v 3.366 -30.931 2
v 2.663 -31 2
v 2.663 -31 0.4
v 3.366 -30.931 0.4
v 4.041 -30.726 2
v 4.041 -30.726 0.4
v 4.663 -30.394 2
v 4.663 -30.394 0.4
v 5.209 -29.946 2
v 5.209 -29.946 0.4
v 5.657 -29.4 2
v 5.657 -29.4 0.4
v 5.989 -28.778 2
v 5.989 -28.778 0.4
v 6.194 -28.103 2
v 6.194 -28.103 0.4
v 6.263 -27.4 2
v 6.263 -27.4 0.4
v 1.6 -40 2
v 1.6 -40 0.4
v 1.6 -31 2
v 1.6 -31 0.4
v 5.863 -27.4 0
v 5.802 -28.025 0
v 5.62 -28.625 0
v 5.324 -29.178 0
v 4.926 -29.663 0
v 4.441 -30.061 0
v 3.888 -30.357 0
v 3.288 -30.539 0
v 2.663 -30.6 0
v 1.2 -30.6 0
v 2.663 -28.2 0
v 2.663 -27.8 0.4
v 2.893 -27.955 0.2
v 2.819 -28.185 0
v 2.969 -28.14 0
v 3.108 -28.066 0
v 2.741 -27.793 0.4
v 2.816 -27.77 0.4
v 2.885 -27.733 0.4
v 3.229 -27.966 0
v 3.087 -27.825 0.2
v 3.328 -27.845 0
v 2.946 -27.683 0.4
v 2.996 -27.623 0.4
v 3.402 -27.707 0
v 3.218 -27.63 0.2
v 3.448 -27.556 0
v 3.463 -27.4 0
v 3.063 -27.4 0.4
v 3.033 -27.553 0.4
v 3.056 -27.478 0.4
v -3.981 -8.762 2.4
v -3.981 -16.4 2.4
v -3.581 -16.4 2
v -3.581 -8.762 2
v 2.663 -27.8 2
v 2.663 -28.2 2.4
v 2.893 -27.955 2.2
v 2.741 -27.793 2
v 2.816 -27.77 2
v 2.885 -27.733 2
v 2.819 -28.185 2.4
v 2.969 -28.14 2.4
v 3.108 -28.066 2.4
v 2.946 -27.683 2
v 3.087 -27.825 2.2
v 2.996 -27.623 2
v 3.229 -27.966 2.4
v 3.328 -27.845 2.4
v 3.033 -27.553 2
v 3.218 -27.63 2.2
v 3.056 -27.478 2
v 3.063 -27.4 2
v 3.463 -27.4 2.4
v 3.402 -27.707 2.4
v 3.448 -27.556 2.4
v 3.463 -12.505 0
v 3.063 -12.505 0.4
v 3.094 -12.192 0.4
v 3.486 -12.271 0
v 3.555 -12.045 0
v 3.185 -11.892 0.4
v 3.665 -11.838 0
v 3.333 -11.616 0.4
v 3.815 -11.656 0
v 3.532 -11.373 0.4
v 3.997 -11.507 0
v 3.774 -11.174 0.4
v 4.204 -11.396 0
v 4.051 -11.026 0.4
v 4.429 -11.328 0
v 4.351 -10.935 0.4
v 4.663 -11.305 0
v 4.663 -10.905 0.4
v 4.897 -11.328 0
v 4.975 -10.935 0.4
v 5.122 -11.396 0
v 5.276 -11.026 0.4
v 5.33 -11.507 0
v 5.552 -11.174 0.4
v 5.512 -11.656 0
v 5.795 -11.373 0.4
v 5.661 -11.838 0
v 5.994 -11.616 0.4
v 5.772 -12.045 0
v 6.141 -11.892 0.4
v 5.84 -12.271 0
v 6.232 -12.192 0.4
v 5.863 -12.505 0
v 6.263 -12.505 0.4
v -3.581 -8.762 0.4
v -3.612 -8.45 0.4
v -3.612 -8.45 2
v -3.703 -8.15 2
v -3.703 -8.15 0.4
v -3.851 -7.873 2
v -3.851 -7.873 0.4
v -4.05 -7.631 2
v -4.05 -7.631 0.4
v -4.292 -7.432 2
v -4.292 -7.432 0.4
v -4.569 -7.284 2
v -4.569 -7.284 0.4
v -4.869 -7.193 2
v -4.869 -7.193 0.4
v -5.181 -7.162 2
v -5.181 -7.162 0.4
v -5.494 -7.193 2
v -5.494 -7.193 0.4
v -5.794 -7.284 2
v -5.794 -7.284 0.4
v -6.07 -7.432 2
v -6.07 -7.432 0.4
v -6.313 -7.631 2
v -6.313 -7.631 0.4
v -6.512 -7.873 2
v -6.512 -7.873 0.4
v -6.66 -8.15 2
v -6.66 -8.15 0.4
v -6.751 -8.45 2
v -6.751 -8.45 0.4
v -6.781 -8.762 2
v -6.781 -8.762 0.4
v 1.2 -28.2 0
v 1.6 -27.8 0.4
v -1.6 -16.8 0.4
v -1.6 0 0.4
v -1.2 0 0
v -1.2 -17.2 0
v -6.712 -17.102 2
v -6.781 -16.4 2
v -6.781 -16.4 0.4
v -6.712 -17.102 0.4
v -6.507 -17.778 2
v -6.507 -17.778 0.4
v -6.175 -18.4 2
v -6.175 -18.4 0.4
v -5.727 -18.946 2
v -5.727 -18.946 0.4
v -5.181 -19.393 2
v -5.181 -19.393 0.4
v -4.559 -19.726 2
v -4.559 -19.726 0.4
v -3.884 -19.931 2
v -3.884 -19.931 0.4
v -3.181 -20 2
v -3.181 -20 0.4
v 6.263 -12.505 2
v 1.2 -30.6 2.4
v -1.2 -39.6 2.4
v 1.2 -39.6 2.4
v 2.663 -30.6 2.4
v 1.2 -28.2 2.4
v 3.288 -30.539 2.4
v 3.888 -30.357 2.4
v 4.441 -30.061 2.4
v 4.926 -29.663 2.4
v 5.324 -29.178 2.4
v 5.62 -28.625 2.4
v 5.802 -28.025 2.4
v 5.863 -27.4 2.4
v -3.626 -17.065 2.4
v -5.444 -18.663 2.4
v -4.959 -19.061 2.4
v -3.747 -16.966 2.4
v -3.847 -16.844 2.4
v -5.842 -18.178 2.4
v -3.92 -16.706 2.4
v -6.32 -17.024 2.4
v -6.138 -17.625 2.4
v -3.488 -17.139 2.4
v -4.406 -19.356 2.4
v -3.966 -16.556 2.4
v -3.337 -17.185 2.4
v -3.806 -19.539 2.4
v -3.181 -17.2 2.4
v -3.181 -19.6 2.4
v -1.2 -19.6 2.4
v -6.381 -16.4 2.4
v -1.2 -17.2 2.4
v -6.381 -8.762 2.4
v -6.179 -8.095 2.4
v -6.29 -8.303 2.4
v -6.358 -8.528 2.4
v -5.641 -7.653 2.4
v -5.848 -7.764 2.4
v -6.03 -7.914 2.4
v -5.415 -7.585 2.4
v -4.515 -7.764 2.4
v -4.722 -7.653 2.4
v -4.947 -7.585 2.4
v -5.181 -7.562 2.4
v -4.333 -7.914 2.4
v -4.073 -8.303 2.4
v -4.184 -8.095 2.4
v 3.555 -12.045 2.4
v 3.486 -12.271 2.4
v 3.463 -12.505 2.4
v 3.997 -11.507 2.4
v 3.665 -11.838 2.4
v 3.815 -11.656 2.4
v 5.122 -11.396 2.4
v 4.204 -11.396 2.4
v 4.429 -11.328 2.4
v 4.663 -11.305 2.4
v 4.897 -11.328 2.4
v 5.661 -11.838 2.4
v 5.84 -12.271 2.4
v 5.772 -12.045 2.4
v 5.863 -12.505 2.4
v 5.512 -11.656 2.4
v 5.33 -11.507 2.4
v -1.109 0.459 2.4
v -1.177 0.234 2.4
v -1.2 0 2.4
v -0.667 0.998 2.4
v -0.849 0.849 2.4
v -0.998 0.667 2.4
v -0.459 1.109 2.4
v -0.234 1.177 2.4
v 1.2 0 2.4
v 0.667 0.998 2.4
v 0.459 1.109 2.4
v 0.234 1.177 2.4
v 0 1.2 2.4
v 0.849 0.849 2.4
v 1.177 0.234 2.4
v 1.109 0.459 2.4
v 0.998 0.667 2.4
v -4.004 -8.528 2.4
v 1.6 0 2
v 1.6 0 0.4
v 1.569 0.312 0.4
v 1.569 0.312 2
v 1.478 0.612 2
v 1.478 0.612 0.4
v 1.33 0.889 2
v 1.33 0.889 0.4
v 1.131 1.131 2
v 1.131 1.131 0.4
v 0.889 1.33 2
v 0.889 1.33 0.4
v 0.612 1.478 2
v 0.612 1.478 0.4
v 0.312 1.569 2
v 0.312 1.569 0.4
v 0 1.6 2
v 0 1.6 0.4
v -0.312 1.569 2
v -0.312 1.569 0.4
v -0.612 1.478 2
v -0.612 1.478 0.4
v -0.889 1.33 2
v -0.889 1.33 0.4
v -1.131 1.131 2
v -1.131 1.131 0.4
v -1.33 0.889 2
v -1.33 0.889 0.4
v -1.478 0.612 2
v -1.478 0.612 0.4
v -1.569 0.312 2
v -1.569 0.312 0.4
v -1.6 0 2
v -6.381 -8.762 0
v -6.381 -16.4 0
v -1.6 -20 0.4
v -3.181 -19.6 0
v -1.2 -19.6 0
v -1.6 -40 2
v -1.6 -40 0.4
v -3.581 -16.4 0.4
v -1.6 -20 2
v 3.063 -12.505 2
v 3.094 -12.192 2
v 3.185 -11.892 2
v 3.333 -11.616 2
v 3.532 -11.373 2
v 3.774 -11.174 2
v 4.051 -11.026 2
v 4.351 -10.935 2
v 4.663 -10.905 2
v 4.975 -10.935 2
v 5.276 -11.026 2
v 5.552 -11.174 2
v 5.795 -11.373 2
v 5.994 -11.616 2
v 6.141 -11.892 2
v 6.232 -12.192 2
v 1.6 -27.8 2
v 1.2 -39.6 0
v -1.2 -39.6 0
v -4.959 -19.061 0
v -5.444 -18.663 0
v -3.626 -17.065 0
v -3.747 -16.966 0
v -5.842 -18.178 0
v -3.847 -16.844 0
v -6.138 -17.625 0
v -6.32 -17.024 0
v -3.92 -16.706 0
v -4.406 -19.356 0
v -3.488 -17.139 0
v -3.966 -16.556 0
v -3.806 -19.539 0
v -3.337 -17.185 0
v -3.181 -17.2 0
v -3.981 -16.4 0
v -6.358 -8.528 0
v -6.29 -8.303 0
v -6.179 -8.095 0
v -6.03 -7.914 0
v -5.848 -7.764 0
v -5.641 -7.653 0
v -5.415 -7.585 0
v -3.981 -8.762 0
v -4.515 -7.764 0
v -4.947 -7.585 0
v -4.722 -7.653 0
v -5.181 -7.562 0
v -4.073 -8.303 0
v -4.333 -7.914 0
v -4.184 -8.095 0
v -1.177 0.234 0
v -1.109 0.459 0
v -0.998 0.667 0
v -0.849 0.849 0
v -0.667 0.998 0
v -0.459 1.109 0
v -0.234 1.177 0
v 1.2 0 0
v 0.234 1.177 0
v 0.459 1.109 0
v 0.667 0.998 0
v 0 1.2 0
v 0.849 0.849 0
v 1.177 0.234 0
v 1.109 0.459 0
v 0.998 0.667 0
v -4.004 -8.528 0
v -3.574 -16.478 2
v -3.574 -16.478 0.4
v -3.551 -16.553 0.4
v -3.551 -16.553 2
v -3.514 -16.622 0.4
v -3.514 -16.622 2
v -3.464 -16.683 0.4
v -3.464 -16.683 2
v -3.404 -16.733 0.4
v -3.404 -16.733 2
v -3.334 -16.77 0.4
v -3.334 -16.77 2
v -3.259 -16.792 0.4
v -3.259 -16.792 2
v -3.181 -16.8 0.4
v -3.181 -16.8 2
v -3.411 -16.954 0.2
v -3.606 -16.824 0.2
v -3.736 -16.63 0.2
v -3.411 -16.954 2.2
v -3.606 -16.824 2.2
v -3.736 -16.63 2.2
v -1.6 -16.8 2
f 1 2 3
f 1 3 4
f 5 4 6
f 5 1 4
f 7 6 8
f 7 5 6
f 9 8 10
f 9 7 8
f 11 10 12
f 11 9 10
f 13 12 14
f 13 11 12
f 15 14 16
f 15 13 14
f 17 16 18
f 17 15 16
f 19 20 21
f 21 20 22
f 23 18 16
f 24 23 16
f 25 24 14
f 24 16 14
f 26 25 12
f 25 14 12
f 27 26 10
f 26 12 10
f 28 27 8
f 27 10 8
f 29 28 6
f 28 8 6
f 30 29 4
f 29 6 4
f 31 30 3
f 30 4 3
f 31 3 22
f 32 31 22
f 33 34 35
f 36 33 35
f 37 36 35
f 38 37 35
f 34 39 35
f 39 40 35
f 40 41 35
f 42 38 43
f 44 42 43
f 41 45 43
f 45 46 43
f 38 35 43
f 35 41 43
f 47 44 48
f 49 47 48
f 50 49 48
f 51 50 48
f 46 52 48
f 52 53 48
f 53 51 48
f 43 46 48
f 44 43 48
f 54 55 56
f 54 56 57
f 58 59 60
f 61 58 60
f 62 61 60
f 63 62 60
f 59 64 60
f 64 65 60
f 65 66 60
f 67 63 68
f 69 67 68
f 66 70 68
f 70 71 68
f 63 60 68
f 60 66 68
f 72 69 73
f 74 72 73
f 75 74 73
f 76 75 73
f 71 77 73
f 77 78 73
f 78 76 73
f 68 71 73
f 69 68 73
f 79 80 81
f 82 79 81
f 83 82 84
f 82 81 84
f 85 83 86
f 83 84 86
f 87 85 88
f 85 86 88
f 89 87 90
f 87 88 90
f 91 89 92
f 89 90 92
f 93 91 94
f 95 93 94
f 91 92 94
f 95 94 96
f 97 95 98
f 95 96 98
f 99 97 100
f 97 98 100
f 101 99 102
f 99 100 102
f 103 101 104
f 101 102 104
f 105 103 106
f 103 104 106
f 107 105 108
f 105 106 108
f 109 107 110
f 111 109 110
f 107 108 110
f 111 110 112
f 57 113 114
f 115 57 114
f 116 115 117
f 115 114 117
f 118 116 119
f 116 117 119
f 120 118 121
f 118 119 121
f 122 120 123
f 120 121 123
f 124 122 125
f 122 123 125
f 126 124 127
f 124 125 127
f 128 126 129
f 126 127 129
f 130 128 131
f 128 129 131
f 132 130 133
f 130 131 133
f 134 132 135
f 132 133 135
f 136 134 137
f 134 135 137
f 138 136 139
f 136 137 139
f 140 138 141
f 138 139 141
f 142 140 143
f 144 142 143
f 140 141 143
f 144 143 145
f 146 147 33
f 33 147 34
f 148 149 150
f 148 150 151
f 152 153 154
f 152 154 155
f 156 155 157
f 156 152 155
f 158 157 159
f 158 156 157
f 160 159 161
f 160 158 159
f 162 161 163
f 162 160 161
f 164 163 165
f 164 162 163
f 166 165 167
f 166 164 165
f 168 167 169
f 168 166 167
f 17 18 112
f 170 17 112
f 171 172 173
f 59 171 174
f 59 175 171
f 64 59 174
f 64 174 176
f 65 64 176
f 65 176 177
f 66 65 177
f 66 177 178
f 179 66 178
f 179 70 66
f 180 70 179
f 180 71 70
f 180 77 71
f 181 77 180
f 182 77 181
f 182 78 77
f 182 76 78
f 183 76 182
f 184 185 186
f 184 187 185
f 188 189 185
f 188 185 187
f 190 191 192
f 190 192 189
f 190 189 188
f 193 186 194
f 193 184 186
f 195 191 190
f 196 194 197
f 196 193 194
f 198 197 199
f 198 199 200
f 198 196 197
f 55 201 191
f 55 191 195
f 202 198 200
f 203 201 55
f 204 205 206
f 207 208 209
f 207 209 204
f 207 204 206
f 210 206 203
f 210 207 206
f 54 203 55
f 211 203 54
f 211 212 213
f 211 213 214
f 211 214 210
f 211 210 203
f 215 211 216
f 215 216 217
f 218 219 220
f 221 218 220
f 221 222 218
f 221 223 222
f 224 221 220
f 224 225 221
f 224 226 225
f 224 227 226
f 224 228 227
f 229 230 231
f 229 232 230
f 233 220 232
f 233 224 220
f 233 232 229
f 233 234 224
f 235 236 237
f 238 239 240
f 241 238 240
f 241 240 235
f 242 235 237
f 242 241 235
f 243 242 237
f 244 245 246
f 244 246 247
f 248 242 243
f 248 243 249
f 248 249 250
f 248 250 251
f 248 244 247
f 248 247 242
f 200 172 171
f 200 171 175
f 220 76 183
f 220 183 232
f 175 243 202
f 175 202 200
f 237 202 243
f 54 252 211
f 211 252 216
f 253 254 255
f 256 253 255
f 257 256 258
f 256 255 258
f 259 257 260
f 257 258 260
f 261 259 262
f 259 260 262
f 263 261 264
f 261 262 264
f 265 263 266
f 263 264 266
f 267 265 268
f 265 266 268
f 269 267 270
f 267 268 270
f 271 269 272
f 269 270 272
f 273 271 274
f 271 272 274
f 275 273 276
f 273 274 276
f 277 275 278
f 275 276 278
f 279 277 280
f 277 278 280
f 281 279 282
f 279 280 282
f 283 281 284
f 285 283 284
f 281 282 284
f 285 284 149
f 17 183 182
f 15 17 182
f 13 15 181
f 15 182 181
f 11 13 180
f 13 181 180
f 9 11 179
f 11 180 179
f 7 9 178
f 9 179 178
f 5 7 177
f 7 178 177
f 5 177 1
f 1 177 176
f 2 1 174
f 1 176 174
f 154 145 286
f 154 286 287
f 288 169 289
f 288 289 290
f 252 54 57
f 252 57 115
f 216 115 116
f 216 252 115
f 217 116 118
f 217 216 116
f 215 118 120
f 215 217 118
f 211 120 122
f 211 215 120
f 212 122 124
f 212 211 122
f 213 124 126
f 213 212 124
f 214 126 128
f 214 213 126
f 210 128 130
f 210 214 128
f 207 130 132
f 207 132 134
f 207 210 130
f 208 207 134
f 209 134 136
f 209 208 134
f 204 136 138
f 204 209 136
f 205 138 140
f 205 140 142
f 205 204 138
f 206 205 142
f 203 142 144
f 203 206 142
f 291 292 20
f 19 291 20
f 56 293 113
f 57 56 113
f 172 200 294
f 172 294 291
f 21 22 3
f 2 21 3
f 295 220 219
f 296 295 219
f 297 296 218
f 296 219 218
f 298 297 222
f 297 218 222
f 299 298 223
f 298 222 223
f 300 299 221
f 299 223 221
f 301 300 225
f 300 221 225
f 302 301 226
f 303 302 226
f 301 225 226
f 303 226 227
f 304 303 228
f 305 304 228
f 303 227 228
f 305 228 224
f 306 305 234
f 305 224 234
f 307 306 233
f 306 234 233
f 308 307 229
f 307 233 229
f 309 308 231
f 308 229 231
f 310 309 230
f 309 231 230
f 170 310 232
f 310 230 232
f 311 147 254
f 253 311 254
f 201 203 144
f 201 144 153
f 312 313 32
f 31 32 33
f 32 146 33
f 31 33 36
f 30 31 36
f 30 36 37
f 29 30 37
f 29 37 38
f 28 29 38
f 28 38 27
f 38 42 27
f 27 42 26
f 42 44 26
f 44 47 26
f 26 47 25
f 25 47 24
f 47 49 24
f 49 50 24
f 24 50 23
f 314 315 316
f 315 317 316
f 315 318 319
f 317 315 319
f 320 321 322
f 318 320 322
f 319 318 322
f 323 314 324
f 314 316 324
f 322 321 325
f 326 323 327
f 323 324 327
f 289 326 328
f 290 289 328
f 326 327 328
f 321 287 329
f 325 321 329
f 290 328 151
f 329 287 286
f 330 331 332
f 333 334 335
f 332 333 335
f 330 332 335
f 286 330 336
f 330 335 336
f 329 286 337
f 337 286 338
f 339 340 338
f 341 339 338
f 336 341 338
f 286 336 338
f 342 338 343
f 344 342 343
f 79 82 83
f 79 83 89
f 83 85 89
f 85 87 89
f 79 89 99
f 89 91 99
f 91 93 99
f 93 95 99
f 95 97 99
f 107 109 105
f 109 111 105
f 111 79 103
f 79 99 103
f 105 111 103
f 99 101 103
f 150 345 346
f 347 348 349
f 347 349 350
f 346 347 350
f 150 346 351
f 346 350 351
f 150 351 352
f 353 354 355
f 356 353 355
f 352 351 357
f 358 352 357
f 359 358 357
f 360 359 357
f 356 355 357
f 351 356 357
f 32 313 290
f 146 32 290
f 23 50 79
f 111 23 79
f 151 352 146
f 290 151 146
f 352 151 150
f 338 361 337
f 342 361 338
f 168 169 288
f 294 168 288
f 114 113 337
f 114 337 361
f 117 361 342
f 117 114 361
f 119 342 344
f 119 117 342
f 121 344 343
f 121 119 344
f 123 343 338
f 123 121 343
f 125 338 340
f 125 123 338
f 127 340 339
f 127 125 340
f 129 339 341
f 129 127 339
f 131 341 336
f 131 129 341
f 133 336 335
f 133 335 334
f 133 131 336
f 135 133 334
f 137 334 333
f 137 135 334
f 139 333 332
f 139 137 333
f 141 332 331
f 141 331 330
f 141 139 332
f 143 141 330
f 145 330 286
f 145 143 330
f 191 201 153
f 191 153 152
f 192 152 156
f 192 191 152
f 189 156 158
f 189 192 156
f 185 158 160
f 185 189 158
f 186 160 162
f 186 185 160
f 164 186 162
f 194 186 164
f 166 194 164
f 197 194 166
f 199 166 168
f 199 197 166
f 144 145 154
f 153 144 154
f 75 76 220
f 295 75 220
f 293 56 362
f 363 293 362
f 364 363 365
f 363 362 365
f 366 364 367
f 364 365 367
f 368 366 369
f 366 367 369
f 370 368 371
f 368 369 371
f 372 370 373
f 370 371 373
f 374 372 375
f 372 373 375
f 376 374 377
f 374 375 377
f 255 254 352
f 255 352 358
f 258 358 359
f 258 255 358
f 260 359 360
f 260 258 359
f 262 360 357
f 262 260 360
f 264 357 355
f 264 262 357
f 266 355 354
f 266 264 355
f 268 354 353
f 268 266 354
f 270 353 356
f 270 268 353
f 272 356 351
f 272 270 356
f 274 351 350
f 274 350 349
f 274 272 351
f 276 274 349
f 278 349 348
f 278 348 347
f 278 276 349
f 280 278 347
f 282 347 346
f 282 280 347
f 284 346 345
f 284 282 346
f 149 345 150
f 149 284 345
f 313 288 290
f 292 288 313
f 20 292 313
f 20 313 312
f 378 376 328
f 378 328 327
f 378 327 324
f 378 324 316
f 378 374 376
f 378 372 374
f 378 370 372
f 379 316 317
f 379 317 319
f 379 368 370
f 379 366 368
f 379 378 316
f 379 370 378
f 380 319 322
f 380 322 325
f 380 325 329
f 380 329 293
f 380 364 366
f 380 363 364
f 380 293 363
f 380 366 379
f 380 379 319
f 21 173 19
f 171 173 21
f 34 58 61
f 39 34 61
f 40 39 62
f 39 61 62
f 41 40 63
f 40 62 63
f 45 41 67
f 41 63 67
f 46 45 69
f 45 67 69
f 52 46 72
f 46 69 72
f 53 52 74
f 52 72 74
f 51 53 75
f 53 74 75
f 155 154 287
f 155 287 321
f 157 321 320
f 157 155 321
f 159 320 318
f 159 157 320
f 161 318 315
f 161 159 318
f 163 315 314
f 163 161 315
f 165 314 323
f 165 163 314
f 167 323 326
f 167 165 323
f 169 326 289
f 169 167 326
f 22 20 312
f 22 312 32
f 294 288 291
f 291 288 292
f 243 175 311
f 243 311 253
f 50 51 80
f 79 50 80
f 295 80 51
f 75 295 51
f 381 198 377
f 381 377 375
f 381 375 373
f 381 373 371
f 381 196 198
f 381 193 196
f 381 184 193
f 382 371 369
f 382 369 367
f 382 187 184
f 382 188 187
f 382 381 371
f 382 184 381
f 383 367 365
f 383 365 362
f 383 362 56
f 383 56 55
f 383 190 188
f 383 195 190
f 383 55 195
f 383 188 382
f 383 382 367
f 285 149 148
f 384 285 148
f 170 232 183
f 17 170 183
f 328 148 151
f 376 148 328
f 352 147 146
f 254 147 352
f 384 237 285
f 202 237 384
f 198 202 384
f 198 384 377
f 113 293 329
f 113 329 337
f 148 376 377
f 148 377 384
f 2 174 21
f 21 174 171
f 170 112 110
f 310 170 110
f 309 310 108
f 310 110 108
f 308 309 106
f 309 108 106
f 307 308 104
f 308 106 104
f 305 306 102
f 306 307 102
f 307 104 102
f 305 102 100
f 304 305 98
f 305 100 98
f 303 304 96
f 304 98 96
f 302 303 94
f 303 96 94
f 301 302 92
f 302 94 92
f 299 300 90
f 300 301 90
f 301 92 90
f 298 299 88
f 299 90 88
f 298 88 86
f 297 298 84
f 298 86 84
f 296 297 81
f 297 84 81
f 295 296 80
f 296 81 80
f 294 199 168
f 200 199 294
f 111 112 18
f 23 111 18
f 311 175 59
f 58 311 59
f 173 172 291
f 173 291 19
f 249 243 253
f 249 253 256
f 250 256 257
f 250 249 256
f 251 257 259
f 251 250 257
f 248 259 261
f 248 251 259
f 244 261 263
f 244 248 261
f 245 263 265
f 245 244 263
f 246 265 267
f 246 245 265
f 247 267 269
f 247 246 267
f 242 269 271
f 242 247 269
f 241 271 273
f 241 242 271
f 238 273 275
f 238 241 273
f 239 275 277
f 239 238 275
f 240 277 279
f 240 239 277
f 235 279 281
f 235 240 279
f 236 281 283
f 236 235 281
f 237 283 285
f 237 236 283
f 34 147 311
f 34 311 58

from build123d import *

# Parameters (mm, degrees)
F0_W     = 1.4632290646
F0_H     = 3.2
F0_W_2   = 1.9813749596
F1_DEPTH = 2.4
F2_R     = 3.6
F3_R     = 0.4
F4_SIZE  = 0.4


with BuildPart() as f1:
    # F0 (on Top) → F1 (new body)
    with BuildSketch(Plane.XY):
        with BuildLine():
            Line((-1.6, 0), (1.6, 0))
            ThreePointArc((1.6, 0), (0, 1.6), (-1.6, 0))
        make_face()
        with BuildLine():
            Line((1.6, -27.8004167259), (1.6, 0))
            ThreePointArc((1.6, 0), (0, -1.6), (-1.6, 0))
            Line((-1.6, 0), (-1.6, -16.8))
            Line((-1.6, -16.8), (-1.6, -20))
            Line((-1.6, -20), (-1.6, -40))
            Line((-1.6, -40), (1.6, -40))
            Line((1.6, -40), (1.6, -31.0004167259))
            Line((1.6, -31.0004167259), (1.6, -27.8004167259))
        make_face()
        with BuildLine():
            ThreePointArc((-1.6, 0), (0, -1.6), (1.6, 0))
            Line((1.6, 0), (-1.6, 0))
        make_face()
        with Locations((2.3316145323, -29.4004167259)):
            Rectangle(F0_W, F0_H)
        with Locations((-2.5906874798, -18.4)):
            Rectangle(F0_W_2, F0_H)
        with BuildLine():
            Line((3.0632290646, -12.50463631), (3.0632290646, -27.8004167259))
            Line((3.0632290646, -27.8004167259), (3.0632290646, -31.0004167259))
            Line((3.0632290646, -31.0004167259), (6.2632290646, -31.0004167259))
            Line((6.2632290646, -31.0004167259), (6.2632290646, -12.50463631))
            ThreePointArc((6.2632290646, -12.50463631), (4.6632290646, -14.10463631), (3.0632290646, -12.50463631))
        make_face()
        with BuildLine():
            Line((-3.5813749596, -20), (-3.5813749596, -16.8))
            Line((-3.5813749596, -16.8), (-3.5813749596, -8.7620876729))
            ThreePointArc((-3.5813749596, -8.7620876729), (-5.1813749596, -10.3620876729), (-6.7813749596, -8.7620876729))
            Line((-6.7813749596, -8.7620876729), (-6.7813749596, -20))
            Line((-6.7813749596, -20), (-3.5813749596, -20))
        make_face()
        with BuildLine():
            ThreePointArc((6.2632290646, -12.50463631), (4.6632290646, -10.90463631), (3.0632290646, -12.50463631))
            Line((3.0632290646, -12.50463631), (6.2632290646, -12.50463631))
        make_face()
        with BuildLine():
            Line((6.2632290646, -12.50463631), (3.0632290646, -12.50463631))
            ThreePointArc((3.0632290646, -12.50463631), (4.6632290646, -14.10463631), (6.2632290646, -12.50463631))
        make_face()
        with BuildLine():
            ThreePointArc((-6.7813749596, -8.7620876729), (-5.1813749596, -10.3620876729), (-3.5813749596, -8.7620876729))
            Line((-3.5813749596, -8.7620876729), (-6.7813749596, -8.7620876729))
        make_face()
        with BuildLine():
            Line((-6.7813749596, -8.7620876729), (-3.5813749596, -8.7620876729))
            ThreePointArc((-3.5813749596, -8.7620876729), (-5.1813749596, -7.1620876729), (-6.7813749596, -8.7620876729))
        make_face()
    extrude(amount=F1_DEPTH)

    # F2
    f2_edges = [f1.edges().sort_by_distance(p)[0] for p in [
        (-6.781375, -20, 1.2),
        (6.263229, -31.000417, 1.2),
    ]]
    fillet(f2_edges, radius=F2_R)

    # F3
    f3_edges = [f1.edges().sort_by_distance(p)[0] for p in [
        (-3.581375, -16.8, 1.2),
        (3.063229, -27.800417, 1.2),
    ]]
    fillet(f3_edges, radius=F3_R)

    # F4
    f4_edges = [f1.edges().sort_by_distance(p)[0] for p in [
        (-3.581375, -12.581044, 2.4),
        (-3.464218, -16.682843, 2.4),
        (-5.181375, -7.162088, 2.4),
        (-2.390687, -16.8, 2.4),
        (-6.781375, -12.581044, 2.4),
        (-1.6, -8.4, 2.4),
        (-5.726959, -18.945584, 2.4),
        (0, 1.6, 2.4),
        (-2.390687, -20, 2.4),
        (1.6, -13.900208, 2.4),
        (-1.6, -30, 2.4),
        (2.131615, -27.800417, 2.4),
        (0, -40, 2.4),
        (2.946072, -27.683259, 2.4),
        (1.6, -35.500208, 2.4),
        (3.063229, -19.952527, 2.4),
        (2.131615, -31.000417, 2.4),
        (4.663229, -10.904636, 2.4),
        (5.208813, -29.946001, 2.4),
        (6.263229, -19.952527, 2.4),
        (-3.581375, -12.581044, 0),
        (-3.464218, -16.682843, 0),
        (-5.181375, -7.162088, 0),
        (-2.390687, -16.8, 0),
        (-6.781375, -12.581044, 0),
        (-1.6, -8.4, 0),
        (-5.726959, -18.945584, 0),
        (0, 1.6, 0),
        (-2.390687, -20, 0),
        (1.6, -13.900208, 0),
        (-1.6, -30, 0),
        (2.131615, -27.800417, 0),
        (0, -40, 0),
        (2.946072, -27.683259, 0),
        (1.6, -35.500208, 0),
        (3.063229, -19.952527, 0),
        (2.131615, -31.000417, 0),
        (4.663229, -10.904636, 0),
        (5.208813, -29.946001, 0),
        (6.263229, -19.952527, 0),
    ]]
    chamfer(f4_edges, length=F4_SIZE)


solid = f1.part
